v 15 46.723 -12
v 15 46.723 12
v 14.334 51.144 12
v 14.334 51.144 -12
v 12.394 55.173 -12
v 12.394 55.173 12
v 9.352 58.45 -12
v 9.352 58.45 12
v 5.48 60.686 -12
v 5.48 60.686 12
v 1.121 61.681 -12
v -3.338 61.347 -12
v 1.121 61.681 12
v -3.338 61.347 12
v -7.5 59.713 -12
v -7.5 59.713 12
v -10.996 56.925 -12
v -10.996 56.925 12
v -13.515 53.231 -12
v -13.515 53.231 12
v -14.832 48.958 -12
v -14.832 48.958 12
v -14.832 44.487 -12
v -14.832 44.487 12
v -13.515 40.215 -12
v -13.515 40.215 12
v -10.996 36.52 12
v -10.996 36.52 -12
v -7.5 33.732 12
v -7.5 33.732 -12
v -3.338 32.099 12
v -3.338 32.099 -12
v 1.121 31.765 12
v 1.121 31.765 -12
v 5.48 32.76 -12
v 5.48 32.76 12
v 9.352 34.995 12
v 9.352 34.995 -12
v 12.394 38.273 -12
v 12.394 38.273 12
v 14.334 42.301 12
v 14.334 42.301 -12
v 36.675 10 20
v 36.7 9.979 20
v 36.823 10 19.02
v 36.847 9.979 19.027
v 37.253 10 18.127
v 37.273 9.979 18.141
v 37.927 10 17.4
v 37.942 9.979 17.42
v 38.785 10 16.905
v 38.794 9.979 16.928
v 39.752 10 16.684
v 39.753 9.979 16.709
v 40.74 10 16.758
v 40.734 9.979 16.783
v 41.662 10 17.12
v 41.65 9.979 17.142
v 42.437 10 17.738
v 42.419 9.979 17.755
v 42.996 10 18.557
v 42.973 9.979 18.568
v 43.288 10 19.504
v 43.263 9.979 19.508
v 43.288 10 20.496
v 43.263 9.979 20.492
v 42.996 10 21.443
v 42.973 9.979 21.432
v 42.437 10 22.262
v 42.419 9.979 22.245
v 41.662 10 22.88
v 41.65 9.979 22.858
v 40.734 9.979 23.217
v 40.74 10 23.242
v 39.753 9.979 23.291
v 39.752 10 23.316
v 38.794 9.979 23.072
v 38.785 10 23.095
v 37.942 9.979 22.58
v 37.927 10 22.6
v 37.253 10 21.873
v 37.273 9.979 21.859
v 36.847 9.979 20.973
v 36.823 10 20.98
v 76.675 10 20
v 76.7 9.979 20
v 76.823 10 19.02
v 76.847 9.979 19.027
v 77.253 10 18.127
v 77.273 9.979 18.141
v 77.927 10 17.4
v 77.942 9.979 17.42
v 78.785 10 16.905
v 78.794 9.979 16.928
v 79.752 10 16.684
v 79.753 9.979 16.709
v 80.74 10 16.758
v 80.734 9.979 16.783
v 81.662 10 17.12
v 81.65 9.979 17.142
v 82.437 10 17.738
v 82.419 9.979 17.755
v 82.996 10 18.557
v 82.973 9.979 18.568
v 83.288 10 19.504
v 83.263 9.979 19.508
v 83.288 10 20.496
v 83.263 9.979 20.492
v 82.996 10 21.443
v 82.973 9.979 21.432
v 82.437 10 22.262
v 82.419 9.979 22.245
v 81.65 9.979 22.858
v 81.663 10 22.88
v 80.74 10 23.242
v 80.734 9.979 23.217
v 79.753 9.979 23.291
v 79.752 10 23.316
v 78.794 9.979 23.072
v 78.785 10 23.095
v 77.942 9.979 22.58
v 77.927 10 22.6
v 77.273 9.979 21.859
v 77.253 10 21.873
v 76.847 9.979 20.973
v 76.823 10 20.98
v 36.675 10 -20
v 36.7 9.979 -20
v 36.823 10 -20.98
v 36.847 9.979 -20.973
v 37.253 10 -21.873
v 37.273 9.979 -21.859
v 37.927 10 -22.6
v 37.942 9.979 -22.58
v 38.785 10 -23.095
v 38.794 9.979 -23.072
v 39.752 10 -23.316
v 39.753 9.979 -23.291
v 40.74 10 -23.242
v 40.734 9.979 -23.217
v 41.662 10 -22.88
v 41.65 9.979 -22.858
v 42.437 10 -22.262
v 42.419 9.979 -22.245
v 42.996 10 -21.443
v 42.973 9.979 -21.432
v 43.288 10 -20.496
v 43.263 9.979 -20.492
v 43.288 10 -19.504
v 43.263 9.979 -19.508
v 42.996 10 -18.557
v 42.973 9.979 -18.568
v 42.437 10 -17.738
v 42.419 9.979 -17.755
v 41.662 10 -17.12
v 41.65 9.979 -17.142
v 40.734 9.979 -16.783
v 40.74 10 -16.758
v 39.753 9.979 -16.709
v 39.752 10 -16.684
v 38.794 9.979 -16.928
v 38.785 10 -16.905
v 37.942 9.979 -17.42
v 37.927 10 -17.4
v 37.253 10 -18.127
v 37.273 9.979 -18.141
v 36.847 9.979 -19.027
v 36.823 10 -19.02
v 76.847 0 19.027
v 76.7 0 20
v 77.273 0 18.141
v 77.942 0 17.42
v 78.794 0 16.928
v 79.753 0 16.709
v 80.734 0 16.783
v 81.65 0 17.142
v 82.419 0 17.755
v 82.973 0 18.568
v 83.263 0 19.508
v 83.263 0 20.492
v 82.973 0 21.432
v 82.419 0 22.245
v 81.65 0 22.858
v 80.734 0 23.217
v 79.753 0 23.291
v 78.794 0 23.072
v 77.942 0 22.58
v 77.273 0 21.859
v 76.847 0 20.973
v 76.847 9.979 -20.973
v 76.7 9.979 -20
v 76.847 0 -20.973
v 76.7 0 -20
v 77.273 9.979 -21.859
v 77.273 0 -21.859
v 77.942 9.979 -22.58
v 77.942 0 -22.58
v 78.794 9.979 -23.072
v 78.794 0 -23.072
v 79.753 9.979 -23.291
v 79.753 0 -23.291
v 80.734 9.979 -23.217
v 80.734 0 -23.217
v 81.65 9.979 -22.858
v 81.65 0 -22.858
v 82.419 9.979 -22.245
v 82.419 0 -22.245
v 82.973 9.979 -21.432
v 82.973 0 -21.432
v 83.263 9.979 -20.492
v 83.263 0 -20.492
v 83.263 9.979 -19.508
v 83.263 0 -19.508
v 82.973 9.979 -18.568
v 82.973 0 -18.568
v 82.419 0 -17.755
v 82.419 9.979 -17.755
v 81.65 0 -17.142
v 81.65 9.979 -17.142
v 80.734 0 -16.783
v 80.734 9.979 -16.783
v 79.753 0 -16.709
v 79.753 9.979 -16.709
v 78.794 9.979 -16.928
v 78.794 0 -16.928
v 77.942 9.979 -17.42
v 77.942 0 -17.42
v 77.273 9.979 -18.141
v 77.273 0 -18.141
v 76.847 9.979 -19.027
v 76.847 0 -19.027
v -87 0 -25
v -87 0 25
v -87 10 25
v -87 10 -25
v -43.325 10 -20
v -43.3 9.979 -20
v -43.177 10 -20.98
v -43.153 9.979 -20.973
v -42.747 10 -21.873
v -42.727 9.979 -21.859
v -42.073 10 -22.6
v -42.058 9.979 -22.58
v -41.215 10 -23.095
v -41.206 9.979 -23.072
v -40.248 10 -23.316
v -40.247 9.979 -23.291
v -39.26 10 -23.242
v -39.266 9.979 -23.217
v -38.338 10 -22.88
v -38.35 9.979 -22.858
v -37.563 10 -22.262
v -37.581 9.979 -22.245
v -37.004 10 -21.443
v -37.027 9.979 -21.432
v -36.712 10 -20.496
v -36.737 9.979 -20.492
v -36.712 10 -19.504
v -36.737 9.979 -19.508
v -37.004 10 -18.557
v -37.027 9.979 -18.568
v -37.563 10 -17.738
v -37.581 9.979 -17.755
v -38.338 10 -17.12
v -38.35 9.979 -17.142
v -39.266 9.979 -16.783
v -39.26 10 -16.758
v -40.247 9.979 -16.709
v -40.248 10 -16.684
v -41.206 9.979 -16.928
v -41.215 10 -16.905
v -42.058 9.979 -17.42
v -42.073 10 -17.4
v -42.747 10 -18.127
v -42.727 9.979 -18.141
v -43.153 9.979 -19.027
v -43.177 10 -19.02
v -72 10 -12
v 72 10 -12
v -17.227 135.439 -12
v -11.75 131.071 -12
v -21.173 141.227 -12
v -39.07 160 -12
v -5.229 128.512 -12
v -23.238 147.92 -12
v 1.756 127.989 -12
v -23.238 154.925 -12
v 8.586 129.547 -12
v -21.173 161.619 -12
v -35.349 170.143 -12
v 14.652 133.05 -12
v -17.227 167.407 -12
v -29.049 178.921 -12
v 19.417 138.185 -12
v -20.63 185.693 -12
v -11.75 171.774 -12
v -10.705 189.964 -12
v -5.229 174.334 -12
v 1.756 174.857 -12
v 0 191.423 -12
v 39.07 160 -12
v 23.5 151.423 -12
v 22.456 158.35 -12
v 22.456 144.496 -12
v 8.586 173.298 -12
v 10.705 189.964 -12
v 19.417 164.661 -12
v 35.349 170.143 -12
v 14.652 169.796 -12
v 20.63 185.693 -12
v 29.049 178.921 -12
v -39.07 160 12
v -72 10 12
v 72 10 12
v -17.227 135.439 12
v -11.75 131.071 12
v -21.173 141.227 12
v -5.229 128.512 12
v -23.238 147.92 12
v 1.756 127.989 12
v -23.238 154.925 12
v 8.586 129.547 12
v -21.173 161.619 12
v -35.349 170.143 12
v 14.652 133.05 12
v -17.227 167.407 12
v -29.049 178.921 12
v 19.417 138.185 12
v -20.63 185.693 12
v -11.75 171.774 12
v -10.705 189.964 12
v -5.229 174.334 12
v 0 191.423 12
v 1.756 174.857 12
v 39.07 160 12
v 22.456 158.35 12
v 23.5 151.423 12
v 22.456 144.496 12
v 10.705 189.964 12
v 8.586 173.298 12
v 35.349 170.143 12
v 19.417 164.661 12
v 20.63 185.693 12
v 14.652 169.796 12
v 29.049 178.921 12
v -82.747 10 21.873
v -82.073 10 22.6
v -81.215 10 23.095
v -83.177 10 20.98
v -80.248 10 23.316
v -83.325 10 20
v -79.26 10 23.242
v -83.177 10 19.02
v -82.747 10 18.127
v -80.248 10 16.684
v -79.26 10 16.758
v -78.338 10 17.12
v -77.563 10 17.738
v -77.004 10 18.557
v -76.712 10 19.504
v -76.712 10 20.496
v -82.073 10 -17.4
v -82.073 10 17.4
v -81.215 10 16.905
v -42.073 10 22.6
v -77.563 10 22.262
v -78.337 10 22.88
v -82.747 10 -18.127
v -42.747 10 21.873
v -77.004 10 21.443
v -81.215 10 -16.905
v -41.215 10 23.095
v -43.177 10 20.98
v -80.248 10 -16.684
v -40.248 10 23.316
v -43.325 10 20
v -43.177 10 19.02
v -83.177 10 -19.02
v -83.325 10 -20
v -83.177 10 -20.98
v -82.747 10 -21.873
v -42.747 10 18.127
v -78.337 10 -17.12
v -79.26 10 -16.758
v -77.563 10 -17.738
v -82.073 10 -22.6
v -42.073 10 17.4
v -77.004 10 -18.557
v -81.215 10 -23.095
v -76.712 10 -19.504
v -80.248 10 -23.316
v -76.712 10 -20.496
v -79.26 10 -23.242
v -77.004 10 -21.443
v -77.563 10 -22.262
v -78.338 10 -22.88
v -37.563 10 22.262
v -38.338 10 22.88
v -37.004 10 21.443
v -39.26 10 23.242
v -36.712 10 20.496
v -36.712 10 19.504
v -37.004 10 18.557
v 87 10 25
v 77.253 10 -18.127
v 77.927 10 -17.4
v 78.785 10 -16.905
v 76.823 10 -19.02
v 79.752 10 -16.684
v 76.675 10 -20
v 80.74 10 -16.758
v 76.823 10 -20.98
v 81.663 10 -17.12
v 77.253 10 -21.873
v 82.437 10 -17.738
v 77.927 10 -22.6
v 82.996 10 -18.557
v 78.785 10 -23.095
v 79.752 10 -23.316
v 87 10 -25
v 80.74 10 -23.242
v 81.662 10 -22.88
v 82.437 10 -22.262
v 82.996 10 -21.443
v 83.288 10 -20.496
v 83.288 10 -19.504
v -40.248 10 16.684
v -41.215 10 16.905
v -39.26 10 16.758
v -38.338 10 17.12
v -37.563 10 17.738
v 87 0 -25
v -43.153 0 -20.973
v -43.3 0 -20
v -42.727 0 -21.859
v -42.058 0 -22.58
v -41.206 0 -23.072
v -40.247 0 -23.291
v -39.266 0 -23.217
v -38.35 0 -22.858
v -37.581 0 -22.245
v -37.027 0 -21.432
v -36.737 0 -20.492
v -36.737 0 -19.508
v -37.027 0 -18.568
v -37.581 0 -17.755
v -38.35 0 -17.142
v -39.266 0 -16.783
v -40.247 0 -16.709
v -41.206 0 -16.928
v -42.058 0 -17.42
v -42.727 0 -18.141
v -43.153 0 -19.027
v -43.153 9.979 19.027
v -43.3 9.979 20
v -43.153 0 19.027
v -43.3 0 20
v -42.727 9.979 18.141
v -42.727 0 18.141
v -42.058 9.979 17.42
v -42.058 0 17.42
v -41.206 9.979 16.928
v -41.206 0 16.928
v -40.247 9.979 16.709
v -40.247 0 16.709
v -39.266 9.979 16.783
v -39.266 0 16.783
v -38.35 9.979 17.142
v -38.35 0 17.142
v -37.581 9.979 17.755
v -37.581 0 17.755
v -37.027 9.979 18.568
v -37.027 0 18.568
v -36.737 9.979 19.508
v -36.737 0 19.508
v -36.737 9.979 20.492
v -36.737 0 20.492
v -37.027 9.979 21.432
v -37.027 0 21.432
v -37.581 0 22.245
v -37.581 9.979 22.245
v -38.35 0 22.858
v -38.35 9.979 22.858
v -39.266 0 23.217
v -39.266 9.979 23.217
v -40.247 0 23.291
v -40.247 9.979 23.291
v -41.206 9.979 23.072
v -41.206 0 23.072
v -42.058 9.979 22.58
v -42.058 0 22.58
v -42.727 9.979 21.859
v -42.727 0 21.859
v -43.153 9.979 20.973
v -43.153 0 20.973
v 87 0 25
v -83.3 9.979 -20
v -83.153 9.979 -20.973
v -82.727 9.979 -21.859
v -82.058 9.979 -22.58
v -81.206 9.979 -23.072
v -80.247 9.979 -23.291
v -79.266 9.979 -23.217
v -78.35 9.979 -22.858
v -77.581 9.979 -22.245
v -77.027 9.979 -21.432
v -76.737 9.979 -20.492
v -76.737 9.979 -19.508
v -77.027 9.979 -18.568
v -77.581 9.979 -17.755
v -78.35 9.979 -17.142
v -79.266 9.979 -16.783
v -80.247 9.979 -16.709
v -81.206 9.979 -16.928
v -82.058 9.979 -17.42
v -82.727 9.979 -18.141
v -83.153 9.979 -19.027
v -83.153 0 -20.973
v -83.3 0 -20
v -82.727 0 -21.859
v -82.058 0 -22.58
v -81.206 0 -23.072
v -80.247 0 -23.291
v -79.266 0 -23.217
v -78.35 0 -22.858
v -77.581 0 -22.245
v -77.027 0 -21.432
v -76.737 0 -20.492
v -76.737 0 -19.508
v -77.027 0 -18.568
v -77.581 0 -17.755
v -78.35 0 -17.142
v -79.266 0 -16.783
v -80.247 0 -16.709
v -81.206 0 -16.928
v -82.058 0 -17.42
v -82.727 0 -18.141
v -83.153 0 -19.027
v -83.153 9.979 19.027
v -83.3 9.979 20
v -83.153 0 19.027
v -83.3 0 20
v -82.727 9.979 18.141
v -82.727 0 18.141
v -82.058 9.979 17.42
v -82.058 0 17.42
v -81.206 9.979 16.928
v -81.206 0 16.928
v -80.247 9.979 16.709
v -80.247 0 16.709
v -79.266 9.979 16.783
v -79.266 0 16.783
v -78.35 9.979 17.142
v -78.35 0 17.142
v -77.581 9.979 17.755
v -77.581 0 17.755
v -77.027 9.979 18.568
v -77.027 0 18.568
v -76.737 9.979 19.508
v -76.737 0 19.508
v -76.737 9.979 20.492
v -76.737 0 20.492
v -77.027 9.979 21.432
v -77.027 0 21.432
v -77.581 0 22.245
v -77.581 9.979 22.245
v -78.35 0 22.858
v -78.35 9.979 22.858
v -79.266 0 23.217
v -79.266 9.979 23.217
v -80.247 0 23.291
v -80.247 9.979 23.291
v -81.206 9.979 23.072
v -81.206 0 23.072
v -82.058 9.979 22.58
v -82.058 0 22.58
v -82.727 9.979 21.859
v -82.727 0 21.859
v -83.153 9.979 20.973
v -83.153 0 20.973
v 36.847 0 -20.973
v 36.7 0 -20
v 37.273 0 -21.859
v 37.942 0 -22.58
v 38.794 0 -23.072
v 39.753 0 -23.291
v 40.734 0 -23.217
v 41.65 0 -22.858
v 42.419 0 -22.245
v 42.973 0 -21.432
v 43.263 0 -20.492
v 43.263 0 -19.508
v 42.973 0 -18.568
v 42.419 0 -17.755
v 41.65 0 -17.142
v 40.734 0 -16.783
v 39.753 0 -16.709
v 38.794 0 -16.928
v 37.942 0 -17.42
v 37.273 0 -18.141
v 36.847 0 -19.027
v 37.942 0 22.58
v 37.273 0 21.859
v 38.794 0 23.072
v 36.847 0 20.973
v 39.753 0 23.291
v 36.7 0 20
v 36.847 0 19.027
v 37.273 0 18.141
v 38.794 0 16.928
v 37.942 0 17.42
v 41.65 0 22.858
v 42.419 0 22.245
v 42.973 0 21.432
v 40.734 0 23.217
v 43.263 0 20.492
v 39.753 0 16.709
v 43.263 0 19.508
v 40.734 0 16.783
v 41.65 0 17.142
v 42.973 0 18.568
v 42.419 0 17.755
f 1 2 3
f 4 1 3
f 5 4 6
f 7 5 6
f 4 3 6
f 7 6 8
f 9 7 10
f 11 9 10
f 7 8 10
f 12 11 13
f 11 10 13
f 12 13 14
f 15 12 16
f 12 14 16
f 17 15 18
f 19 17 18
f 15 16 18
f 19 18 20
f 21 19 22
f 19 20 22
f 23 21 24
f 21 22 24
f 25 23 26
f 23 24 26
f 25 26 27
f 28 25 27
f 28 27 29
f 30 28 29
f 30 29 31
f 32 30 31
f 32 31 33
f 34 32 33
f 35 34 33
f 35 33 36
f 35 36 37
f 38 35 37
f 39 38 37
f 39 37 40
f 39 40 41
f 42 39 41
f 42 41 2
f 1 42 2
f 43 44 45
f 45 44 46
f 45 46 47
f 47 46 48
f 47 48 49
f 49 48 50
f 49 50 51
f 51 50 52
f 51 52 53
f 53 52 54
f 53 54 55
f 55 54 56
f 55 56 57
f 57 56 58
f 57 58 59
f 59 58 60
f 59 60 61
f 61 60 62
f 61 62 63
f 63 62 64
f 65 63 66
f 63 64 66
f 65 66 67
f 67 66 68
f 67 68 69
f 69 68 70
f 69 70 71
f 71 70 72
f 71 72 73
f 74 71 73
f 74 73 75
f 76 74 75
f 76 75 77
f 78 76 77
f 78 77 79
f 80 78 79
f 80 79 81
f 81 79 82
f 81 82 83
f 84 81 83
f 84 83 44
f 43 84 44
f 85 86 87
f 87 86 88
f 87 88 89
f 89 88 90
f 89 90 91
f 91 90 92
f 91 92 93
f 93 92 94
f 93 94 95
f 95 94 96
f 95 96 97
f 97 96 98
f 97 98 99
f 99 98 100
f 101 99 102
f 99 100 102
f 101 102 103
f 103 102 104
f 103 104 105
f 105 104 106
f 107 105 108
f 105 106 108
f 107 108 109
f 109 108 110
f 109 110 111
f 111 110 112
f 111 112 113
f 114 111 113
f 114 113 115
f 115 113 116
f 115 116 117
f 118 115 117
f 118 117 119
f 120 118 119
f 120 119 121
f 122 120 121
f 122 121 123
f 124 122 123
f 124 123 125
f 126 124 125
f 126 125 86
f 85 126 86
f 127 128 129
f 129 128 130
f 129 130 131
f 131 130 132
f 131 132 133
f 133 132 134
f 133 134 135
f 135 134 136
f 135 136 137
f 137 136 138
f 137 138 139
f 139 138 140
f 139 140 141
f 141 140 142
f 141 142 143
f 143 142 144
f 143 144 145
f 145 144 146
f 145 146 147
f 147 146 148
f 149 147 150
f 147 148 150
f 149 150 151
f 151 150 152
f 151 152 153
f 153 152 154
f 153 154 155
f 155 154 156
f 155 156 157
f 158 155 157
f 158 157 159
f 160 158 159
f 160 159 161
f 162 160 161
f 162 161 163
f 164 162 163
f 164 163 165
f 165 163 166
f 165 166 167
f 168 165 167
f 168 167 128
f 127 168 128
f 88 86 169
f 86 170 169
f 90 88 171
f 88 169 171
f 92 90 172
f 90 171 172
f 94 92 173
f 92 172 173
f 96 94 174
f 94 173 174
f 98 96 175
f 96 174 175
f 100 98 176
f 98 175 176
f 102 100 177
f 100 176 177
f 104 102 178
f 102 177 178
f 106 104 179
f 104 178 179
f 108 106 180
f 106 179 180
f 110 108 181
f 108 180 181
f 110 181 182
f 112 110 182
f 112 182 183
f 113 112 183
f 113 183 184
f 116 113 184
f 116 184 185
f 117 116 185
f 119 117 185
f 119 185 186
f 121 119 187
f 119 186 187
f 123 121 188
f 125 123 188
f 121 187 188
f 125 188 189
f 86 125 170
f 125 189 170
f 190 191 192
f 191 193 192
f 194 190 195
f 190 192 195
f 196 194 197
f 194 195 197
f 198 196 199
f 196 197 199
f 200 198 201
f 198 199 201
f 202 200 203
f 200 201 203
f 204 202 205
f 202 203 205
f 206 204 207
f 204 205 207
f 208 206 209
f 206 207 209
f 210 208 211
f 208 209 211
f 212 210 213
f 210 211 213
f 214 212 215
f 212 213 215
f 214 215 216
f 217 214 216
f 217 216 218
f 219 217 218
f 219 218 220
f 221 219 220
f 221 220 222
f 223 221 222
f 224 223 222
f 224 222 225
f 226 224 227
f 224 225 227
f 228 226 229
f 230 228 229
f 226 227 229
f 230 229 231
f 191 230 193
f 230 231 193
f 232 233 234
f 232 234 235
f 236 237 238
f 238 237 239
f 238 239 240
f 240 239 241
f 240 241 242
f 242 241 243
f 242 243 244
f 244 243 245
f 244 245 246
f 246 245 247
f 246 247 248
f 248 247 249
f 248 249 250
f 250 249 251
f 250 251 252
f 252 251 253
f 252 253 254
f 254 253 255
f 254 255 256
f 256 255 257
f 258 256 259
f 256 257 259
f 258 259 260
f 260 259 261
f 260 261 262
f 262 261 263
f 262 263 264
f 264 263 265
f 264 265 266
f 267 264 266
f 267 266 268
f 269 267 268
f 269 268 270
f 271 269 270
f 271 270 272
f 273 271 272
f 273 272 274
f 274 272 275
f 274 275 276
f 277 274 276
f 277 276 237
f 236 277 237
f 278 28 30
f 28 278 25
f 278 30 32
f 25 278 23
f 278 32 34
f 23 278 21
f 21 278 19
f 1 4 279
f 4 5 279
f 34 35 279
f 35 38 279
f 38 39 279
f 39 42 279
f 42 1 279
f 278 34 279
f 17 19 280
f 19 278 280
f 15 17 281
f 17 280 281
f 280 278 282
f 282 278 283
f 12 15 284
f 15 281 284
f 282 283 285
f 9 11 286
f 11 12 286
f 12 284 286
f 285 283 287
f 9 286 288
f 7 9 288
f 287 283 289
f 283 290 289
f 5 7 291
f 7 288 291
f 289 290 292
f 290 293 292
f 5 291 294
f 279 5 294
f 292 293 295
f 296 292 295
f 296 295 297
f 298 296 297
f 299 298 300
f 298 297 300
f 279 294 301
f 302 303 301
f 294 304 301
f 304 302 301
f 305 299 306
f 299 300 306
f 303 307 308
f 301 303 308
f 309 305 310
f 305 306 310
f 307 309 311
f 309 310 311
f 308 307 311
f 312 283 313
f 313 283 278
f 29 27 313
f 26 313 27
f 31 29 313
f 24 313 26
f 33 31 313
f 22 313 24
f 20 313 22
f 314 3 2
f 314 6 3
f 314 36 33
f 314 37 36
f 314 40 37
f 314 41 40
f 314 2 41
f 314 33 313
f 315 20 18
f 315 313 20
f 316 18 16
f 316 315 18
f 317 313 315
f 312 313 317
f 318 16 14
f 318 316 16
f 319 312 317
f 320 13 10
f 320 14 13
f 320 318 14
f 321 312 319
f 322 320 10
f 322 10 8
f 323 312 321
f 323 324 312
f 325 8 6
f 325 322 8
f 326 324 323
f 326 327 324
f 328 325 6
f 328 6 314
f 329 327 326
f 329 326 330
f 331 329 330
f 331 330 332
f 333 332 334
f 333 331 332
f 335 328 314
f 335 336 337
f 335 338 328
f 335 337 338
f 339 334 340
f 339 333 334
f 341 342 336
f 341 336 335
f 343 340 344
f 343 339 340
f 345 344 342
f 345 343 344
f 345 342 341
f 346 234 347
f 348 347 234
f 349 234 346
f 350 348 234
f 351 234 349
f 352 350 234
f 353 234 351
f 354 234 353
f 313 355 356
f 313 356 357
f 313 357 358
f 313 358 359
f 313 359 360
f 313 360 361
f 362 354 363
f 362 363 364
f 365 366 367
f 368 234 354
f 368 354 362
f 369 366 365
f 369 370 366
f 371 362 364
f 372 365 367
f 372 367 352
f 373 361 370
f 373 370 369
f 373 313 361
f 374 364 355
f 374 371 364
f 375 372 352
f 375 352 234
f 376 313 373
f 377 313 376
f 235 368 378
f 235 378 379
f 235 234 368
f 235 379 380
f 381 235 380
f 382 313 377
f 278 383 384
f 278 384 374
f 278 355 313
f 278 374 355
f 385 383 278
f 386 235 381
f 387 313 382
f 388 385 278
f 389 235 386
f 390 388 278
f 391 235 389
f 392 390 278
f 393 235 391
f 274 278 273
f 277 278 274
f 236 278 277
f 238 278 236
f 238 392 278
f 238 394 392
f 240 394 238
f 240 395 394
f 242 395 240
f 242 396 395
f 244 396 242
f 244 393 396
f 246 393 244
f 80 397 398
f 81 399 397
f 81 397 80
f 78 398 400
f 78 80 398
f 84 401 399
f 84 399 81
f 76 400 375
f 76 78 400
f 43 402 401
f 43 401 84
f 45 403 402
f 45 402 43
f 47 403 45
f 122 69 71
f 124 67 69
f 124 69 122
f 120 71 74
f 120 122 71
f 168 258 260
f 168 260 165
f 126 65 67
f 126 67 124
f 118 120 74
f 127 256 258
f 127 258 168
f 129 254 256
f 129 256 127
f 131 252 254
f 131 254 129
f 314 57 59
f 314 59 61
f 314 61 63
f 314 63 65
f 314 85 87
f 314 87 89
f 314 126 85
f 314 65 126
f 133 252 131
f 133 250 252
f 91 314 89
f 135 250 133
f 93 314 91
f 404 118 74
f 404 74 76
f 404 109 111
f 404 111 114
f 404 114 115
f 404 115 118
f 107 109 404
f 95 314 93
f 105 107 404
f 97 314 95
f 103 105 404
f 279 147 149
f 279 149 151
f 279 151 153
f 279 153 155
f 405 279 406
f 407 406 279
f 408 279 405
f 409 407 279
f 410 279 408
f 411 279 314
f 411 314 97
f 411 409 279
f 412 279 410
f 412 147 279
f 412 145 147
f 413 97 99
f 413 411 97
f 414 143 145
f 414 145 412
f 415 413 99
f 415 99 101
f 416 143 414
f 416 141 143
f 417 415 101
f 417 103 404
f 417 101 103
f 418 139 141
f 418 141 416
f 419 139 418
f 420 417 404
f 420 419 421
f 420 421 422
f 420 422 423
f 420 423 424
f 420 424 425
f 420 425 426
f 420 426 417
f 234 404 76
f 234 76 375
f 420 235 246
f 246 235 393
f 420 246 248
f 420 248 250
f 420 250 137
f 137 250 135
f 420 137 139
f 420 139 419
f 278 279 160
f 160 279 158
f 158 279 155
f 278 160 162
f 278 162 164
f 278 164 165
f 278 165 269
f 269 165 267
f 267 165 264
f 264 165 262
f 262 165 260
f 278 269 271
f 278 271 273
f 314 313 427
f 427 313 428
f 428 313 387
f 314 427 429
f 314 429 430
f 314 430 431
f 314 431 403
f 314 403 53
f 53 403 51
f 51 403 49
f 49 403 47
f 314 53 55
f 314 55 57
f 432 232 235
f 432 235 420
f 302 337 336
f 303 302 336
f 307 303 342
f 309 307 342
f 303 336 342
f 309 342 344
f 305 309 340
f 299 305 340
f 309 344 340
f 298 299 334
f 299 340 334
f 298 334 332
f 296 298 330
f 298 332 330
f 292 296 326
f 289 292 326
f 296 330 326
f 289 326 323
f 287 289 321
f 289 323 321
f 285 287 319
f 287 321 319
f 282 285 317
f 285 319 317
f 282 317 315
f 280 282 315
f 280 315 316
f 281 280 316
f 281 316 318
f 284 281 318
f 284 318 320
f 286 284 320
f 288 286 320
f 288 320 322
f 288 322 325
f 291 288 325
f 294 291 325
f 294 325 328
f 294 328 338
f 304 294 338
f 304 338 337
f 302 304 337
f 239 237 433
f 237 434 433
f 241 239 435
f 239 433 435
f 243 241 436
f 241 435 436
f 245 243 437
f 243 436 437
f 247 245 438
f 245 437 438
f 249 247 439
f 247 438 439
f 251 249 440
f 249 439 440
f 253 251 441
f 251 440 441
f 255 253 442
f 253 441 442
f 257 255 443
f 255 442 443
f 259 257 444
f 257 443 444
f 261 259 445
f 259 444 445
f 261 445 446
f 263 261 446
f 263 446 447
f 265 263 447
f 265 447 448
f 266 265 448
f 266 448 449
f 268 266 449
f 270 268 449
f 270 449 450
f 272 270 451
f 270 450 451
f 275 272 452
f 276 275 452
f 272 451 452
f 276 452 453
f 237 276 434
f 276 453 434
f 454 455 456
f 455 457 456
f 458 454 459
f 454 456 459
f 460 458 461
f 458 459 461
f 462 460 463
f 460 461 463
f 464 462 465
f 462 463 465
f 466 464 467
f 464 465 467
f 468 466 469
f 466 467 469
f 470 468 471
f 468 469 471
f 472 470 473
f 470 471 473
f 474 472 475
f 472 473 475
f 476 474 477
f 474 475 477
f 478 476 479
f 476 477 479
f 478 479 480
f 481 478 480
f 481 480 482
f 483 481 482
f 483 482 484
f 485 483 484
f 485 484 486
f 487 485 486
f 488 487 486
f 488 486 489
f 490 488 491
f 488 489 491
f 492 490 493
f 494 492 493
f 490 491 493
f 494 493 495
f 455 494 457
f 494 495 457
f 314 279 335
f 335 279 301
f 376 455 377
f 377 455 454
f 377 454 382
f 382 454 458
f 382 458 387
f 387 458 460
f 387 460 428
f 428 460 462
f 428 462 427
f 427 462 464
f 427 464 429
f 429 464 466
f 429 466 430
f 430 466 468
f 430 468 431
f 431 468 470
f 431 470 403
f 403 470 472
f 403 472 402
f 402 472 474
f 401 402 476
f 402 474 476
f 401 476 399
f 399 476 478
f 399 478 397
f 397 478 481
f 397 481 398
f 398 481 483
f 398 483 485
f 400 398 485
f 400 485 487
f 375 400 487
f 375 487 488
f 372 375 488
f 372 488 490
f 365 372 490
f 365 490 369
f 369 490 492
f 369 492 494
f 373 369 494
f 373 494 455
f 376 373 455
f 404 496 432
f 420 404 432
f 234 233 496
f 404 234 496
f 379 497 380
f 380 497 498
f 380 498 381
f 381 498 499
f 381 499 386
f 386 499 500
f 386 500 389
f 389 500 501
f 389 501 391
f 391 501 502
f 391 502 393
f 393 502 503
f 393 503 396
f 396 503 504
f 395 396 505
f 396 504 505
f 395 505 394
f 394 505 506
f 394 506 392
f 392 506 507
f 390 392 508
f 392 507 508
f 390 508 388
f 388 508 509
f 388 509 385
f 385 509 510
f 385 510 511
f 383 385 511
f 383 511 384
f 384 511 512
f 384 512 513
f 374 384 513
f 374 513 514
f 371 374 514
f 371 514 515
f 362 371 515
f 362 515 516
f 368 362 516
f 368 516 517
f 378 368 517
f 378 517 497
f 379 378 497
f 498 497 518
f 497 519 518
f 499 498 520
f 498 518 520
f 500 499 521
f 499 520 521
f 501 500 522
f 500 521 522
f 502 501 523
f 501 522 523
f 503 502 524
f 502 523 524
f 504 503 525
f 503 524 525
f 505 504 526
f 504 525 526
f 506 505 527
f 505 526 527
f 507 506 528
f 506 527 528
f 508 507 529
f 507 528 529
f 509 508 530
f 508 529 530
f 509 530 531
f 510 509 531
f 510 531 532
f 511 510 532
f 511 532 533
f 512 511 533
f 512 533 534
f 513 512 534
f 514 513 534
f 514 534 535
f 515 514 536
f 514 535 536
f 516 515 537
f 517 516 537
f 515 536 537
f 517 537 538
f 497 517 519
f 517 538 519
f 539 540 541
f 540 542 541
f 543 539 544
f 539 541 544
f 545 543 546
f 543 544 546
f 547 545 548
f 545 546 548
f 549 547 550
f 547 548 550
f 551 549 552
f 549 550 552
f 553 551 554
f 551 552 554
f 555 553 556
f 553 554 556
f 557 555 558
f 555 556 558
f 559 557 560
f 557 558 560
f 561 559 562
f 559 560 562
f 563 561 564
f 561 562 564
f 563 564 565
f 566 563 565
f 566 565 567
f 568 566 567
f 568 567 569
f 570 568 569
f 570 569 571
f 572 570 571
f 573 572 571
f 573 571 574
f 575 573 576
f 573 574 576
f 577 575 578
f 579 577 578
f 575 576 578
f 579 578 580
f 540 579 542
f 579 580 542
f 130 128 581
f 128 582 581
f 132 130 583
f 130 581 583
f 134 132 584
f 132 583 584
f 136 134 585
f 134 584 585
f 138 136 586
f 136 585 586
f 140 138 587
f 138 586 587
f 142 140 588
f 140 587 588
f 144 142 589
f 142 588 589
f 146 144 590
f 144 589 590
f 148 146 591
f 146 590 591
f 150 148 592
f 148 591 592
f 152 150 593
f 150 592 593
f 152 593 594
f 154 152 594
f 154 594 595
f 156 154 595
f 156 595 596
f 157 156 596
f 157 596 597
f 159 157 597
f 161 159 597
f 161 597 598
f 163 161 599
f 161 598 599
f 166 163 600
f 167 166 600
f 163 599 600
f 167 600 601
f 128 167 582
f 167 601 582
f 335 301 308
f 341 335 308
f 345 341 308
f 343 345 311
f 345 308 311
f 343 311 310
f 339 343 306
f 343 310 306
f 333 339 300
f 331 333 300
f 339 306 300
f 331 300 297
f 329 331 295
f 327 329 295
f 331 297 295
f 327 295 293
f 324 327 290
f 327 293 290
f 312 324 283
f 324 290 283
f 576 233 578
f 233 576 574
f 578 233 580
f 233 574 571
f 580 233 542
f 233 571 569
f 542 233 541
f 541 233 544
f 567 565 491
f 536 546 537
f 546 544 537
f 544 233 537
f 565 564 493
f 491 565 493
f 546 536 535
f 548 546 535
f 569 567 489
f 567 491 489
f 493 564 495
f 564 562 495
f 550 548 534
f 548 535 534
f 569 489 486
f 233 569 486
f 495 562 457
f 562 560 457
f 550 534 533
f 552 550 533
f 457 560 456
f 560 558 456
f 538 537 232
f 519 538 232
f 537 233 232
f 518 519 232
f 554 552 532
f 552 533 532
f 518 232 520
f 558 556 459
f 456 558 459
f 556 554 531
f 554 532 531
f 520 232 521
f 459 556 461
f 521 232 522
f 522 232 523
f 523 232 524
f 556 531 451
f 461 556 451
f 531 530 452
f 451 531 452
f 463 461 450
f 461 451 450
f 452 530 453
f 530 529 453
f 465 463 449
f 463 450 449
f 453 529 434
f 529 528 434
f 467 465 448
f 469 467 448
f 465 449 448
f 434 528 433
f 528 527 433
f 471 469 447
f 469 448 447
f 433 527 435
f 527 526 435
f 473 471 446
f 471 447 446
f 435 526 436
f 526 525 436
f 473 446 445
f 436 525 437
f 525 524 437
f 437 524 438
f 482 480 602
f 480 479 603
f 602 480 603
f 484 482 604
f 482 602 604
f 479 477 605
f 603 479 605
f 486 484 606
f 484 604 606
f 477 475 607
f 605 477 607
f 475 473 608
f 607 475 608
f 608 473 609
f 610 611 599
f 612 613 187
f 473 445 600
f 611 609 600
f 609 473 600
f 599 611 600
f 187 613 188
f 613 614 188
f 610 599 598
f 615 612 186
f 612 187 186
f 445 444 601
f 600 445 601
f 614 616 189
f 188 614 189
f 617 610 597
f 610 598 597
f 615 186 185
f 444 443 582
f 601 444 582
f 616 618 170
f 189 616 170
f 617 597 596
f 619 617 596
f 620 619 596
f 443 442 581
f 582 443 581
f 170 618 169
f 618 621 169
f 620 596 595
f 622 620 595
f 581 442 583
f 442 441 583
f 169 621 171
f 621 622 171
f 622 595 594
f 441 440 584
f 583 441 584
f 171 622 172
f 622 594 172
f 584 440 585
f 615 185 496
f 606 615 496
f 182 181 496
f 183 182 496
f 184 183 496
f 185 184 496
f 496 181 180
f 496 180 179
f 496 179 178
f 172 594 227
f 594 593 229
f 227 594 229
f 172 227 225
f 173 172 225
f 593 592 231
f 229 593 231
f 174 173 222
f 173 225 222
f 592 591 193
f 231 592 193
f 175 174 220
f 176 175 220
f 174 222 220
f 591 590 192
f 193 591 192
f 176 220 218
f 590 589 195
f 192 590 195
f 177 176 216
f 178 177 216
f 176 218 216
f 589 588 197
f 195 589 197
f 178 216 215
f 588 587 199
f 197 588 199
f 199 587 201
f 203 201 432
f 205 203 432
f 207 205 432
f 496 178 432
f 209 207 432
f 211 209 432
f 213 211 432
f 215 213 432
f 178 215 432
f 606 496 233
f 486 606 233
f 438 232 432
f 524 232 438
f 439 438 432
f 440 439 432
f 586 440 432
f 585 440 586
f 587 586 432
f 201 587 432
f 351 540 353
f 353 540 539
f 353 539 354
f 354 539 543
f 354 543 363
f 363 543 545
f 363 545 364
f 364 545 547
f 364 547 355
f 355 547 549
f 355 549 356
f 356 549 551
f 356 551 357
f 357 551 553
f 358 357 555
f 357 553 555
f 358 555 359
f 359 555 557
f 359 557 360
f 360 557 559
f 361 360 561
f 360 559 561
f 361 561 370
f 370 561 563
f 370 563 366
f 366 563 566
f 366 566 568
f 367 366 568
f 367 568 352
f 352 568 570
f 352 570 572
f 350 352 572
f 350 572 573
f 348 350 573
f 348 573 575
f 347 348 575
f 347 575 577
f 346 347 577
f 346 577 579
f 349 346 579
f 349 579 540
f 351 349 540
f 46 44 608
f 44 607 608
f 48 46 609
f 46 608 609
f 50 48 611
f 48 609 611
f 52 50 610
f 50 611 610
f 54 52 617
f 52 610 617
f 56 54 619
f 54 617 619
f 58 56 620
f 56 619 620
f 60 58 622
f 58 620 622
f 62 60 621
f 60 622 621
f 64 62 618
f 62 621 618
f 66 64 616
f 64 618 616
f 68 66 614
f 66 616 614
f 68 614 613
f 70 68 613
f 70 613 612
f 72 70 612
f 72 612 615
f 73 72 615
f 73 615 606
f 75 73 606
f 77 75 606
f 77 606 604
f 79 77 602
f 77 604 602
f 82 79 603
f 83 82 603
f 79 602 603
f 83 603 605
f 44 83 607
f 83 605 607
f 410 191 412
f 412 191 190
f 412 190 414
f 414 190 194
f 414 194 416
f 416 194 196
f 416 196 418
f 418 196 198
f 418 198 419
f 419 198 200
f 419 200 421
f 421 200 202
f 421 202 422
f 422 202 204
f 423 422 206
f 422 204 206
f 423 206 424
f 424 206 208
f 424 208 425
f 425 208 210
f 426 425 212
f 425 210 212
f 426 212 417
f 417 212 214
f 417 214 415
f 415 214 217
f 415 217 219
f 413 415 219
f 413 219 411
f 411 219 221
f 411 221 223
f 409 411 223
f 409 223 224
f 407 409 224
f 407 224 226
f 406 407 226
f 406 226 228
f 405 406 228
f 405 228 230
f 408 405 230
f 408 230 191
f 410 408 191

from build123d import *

# Parameters (mm, degrees)
SKETCH1_W                      = 174
SKETCH1_H                      = 50
BOSS_EXTRUDE1_DEPTH            = 10
M6_CLEARANCE_HOLE1_D           = 6.6
M6_CLEARANCE_HOLE1_CSINK_D     = 6.65
M6_CLEARANCE_HOLE1_CSINK_ANGLE = 100
BOSS_EXTRUDE2_DEPTH            = 12
BOSS_EXTRUDE2_DEPTH_BACK       = 12
CUT_EXTRUDE1_REACH             = 215.496
SKETCH7_R                      = 15
SKETCH7_R_2                    = 23.5


with BuildPart() as part:
    # Sketch1 → Boss-Extrude1 (new body)
    with BuildSketch(Plane(origin=(0, 0, 0), x_dir=(1, 0, 0), z_dir=(0, 1, 0))):
        Rectangle(SKETCH1_W, SKETCH1_H)
    extrude(amount=BOSS_EXTRUDE1_DEPTH)

    # M6 Clearance Hole1 (through all)
    with Locations(Plane(origin=(0, 10, 0), x_dir=(1, 0, 0), z_dir=(0, 1, 0))):
        with Locations((-80, 20), (-40, 20), (-80, -20), (-40, -20), (40, 20), (80, 20), (40, -20), (80, -20)):
            CounterSinkHole(M6_CLEARANCE_HOLE1_D / 2, M6_CLEARANCE_HOLE1_CSINK_D / 2, counter_sink_angle=M6_CLEARANCE_HOLE1_CSINK_ANGLE)

    # Sketch6 → Boss-Extrude2 (add, two sides: drawn at the far end of the back side and taken through both)
    with BuildSketch(Plane.XY.offset(-BOSS_EXTRUDE2_DEPTH_BACK)):
        with BuildLine():
            Line((-72, 10), (72, 10))
            Line((72, 10), (39.069577731, 160))
            ThreePointArc((39.069577731, 160), (0, 191.422815383), (-39.069577731, 160))
            Line((-39.069577731, 160), (-72, 10))
        make_face()
    extrude(amount=BOSS_EXTRUDE2_DEPTH + BOSS_EXTRUDE2_DEPTH_BACK)

    # Sketch7 → Cut-Extrude1 (cut, up to next)
    with BuildSketch(Plane.XY.offset(12), mode=Mode.PRIVATE) as cut_extrude1_sk1:
        with Locations((0, 46.722815383)):
            Circle(SKETCH7_R)
    cut_extrude1_tool1 = extrude(cut_extrude1_sk1.sketch, amount=-CUT_EXTRUDE1_REACH, mode=Mode.PRIVATE) & part.part
    # Sketch7 → Cut-Extrude1 (cut, up to next)
    with BuildSketch(Plane.XY.offset(12), mode=Mode.PRIVATE) as cut_extrude1_sk2:
        with Locations((0, 151.422815383)):
            Circle(SKETCH7_R_2)
    cut_extrude1_tool2 = extrude(cut_extrude1_sk2.sketch, amount=-CUT_EXTRUDE1_REACH, mode=Mode.PRIVATE) & part.part
    add(cut_extrude1_tool1.solids().sort_by_distance((0, 46.722815, 12))[0], mode=Mode.SUBTRACT)
    add(cut_extrude1_tool2.solids().sort_by_distance((0, 151.422815, 12))[0], mode=Mode.SUBTRACT)


solid = part.part
